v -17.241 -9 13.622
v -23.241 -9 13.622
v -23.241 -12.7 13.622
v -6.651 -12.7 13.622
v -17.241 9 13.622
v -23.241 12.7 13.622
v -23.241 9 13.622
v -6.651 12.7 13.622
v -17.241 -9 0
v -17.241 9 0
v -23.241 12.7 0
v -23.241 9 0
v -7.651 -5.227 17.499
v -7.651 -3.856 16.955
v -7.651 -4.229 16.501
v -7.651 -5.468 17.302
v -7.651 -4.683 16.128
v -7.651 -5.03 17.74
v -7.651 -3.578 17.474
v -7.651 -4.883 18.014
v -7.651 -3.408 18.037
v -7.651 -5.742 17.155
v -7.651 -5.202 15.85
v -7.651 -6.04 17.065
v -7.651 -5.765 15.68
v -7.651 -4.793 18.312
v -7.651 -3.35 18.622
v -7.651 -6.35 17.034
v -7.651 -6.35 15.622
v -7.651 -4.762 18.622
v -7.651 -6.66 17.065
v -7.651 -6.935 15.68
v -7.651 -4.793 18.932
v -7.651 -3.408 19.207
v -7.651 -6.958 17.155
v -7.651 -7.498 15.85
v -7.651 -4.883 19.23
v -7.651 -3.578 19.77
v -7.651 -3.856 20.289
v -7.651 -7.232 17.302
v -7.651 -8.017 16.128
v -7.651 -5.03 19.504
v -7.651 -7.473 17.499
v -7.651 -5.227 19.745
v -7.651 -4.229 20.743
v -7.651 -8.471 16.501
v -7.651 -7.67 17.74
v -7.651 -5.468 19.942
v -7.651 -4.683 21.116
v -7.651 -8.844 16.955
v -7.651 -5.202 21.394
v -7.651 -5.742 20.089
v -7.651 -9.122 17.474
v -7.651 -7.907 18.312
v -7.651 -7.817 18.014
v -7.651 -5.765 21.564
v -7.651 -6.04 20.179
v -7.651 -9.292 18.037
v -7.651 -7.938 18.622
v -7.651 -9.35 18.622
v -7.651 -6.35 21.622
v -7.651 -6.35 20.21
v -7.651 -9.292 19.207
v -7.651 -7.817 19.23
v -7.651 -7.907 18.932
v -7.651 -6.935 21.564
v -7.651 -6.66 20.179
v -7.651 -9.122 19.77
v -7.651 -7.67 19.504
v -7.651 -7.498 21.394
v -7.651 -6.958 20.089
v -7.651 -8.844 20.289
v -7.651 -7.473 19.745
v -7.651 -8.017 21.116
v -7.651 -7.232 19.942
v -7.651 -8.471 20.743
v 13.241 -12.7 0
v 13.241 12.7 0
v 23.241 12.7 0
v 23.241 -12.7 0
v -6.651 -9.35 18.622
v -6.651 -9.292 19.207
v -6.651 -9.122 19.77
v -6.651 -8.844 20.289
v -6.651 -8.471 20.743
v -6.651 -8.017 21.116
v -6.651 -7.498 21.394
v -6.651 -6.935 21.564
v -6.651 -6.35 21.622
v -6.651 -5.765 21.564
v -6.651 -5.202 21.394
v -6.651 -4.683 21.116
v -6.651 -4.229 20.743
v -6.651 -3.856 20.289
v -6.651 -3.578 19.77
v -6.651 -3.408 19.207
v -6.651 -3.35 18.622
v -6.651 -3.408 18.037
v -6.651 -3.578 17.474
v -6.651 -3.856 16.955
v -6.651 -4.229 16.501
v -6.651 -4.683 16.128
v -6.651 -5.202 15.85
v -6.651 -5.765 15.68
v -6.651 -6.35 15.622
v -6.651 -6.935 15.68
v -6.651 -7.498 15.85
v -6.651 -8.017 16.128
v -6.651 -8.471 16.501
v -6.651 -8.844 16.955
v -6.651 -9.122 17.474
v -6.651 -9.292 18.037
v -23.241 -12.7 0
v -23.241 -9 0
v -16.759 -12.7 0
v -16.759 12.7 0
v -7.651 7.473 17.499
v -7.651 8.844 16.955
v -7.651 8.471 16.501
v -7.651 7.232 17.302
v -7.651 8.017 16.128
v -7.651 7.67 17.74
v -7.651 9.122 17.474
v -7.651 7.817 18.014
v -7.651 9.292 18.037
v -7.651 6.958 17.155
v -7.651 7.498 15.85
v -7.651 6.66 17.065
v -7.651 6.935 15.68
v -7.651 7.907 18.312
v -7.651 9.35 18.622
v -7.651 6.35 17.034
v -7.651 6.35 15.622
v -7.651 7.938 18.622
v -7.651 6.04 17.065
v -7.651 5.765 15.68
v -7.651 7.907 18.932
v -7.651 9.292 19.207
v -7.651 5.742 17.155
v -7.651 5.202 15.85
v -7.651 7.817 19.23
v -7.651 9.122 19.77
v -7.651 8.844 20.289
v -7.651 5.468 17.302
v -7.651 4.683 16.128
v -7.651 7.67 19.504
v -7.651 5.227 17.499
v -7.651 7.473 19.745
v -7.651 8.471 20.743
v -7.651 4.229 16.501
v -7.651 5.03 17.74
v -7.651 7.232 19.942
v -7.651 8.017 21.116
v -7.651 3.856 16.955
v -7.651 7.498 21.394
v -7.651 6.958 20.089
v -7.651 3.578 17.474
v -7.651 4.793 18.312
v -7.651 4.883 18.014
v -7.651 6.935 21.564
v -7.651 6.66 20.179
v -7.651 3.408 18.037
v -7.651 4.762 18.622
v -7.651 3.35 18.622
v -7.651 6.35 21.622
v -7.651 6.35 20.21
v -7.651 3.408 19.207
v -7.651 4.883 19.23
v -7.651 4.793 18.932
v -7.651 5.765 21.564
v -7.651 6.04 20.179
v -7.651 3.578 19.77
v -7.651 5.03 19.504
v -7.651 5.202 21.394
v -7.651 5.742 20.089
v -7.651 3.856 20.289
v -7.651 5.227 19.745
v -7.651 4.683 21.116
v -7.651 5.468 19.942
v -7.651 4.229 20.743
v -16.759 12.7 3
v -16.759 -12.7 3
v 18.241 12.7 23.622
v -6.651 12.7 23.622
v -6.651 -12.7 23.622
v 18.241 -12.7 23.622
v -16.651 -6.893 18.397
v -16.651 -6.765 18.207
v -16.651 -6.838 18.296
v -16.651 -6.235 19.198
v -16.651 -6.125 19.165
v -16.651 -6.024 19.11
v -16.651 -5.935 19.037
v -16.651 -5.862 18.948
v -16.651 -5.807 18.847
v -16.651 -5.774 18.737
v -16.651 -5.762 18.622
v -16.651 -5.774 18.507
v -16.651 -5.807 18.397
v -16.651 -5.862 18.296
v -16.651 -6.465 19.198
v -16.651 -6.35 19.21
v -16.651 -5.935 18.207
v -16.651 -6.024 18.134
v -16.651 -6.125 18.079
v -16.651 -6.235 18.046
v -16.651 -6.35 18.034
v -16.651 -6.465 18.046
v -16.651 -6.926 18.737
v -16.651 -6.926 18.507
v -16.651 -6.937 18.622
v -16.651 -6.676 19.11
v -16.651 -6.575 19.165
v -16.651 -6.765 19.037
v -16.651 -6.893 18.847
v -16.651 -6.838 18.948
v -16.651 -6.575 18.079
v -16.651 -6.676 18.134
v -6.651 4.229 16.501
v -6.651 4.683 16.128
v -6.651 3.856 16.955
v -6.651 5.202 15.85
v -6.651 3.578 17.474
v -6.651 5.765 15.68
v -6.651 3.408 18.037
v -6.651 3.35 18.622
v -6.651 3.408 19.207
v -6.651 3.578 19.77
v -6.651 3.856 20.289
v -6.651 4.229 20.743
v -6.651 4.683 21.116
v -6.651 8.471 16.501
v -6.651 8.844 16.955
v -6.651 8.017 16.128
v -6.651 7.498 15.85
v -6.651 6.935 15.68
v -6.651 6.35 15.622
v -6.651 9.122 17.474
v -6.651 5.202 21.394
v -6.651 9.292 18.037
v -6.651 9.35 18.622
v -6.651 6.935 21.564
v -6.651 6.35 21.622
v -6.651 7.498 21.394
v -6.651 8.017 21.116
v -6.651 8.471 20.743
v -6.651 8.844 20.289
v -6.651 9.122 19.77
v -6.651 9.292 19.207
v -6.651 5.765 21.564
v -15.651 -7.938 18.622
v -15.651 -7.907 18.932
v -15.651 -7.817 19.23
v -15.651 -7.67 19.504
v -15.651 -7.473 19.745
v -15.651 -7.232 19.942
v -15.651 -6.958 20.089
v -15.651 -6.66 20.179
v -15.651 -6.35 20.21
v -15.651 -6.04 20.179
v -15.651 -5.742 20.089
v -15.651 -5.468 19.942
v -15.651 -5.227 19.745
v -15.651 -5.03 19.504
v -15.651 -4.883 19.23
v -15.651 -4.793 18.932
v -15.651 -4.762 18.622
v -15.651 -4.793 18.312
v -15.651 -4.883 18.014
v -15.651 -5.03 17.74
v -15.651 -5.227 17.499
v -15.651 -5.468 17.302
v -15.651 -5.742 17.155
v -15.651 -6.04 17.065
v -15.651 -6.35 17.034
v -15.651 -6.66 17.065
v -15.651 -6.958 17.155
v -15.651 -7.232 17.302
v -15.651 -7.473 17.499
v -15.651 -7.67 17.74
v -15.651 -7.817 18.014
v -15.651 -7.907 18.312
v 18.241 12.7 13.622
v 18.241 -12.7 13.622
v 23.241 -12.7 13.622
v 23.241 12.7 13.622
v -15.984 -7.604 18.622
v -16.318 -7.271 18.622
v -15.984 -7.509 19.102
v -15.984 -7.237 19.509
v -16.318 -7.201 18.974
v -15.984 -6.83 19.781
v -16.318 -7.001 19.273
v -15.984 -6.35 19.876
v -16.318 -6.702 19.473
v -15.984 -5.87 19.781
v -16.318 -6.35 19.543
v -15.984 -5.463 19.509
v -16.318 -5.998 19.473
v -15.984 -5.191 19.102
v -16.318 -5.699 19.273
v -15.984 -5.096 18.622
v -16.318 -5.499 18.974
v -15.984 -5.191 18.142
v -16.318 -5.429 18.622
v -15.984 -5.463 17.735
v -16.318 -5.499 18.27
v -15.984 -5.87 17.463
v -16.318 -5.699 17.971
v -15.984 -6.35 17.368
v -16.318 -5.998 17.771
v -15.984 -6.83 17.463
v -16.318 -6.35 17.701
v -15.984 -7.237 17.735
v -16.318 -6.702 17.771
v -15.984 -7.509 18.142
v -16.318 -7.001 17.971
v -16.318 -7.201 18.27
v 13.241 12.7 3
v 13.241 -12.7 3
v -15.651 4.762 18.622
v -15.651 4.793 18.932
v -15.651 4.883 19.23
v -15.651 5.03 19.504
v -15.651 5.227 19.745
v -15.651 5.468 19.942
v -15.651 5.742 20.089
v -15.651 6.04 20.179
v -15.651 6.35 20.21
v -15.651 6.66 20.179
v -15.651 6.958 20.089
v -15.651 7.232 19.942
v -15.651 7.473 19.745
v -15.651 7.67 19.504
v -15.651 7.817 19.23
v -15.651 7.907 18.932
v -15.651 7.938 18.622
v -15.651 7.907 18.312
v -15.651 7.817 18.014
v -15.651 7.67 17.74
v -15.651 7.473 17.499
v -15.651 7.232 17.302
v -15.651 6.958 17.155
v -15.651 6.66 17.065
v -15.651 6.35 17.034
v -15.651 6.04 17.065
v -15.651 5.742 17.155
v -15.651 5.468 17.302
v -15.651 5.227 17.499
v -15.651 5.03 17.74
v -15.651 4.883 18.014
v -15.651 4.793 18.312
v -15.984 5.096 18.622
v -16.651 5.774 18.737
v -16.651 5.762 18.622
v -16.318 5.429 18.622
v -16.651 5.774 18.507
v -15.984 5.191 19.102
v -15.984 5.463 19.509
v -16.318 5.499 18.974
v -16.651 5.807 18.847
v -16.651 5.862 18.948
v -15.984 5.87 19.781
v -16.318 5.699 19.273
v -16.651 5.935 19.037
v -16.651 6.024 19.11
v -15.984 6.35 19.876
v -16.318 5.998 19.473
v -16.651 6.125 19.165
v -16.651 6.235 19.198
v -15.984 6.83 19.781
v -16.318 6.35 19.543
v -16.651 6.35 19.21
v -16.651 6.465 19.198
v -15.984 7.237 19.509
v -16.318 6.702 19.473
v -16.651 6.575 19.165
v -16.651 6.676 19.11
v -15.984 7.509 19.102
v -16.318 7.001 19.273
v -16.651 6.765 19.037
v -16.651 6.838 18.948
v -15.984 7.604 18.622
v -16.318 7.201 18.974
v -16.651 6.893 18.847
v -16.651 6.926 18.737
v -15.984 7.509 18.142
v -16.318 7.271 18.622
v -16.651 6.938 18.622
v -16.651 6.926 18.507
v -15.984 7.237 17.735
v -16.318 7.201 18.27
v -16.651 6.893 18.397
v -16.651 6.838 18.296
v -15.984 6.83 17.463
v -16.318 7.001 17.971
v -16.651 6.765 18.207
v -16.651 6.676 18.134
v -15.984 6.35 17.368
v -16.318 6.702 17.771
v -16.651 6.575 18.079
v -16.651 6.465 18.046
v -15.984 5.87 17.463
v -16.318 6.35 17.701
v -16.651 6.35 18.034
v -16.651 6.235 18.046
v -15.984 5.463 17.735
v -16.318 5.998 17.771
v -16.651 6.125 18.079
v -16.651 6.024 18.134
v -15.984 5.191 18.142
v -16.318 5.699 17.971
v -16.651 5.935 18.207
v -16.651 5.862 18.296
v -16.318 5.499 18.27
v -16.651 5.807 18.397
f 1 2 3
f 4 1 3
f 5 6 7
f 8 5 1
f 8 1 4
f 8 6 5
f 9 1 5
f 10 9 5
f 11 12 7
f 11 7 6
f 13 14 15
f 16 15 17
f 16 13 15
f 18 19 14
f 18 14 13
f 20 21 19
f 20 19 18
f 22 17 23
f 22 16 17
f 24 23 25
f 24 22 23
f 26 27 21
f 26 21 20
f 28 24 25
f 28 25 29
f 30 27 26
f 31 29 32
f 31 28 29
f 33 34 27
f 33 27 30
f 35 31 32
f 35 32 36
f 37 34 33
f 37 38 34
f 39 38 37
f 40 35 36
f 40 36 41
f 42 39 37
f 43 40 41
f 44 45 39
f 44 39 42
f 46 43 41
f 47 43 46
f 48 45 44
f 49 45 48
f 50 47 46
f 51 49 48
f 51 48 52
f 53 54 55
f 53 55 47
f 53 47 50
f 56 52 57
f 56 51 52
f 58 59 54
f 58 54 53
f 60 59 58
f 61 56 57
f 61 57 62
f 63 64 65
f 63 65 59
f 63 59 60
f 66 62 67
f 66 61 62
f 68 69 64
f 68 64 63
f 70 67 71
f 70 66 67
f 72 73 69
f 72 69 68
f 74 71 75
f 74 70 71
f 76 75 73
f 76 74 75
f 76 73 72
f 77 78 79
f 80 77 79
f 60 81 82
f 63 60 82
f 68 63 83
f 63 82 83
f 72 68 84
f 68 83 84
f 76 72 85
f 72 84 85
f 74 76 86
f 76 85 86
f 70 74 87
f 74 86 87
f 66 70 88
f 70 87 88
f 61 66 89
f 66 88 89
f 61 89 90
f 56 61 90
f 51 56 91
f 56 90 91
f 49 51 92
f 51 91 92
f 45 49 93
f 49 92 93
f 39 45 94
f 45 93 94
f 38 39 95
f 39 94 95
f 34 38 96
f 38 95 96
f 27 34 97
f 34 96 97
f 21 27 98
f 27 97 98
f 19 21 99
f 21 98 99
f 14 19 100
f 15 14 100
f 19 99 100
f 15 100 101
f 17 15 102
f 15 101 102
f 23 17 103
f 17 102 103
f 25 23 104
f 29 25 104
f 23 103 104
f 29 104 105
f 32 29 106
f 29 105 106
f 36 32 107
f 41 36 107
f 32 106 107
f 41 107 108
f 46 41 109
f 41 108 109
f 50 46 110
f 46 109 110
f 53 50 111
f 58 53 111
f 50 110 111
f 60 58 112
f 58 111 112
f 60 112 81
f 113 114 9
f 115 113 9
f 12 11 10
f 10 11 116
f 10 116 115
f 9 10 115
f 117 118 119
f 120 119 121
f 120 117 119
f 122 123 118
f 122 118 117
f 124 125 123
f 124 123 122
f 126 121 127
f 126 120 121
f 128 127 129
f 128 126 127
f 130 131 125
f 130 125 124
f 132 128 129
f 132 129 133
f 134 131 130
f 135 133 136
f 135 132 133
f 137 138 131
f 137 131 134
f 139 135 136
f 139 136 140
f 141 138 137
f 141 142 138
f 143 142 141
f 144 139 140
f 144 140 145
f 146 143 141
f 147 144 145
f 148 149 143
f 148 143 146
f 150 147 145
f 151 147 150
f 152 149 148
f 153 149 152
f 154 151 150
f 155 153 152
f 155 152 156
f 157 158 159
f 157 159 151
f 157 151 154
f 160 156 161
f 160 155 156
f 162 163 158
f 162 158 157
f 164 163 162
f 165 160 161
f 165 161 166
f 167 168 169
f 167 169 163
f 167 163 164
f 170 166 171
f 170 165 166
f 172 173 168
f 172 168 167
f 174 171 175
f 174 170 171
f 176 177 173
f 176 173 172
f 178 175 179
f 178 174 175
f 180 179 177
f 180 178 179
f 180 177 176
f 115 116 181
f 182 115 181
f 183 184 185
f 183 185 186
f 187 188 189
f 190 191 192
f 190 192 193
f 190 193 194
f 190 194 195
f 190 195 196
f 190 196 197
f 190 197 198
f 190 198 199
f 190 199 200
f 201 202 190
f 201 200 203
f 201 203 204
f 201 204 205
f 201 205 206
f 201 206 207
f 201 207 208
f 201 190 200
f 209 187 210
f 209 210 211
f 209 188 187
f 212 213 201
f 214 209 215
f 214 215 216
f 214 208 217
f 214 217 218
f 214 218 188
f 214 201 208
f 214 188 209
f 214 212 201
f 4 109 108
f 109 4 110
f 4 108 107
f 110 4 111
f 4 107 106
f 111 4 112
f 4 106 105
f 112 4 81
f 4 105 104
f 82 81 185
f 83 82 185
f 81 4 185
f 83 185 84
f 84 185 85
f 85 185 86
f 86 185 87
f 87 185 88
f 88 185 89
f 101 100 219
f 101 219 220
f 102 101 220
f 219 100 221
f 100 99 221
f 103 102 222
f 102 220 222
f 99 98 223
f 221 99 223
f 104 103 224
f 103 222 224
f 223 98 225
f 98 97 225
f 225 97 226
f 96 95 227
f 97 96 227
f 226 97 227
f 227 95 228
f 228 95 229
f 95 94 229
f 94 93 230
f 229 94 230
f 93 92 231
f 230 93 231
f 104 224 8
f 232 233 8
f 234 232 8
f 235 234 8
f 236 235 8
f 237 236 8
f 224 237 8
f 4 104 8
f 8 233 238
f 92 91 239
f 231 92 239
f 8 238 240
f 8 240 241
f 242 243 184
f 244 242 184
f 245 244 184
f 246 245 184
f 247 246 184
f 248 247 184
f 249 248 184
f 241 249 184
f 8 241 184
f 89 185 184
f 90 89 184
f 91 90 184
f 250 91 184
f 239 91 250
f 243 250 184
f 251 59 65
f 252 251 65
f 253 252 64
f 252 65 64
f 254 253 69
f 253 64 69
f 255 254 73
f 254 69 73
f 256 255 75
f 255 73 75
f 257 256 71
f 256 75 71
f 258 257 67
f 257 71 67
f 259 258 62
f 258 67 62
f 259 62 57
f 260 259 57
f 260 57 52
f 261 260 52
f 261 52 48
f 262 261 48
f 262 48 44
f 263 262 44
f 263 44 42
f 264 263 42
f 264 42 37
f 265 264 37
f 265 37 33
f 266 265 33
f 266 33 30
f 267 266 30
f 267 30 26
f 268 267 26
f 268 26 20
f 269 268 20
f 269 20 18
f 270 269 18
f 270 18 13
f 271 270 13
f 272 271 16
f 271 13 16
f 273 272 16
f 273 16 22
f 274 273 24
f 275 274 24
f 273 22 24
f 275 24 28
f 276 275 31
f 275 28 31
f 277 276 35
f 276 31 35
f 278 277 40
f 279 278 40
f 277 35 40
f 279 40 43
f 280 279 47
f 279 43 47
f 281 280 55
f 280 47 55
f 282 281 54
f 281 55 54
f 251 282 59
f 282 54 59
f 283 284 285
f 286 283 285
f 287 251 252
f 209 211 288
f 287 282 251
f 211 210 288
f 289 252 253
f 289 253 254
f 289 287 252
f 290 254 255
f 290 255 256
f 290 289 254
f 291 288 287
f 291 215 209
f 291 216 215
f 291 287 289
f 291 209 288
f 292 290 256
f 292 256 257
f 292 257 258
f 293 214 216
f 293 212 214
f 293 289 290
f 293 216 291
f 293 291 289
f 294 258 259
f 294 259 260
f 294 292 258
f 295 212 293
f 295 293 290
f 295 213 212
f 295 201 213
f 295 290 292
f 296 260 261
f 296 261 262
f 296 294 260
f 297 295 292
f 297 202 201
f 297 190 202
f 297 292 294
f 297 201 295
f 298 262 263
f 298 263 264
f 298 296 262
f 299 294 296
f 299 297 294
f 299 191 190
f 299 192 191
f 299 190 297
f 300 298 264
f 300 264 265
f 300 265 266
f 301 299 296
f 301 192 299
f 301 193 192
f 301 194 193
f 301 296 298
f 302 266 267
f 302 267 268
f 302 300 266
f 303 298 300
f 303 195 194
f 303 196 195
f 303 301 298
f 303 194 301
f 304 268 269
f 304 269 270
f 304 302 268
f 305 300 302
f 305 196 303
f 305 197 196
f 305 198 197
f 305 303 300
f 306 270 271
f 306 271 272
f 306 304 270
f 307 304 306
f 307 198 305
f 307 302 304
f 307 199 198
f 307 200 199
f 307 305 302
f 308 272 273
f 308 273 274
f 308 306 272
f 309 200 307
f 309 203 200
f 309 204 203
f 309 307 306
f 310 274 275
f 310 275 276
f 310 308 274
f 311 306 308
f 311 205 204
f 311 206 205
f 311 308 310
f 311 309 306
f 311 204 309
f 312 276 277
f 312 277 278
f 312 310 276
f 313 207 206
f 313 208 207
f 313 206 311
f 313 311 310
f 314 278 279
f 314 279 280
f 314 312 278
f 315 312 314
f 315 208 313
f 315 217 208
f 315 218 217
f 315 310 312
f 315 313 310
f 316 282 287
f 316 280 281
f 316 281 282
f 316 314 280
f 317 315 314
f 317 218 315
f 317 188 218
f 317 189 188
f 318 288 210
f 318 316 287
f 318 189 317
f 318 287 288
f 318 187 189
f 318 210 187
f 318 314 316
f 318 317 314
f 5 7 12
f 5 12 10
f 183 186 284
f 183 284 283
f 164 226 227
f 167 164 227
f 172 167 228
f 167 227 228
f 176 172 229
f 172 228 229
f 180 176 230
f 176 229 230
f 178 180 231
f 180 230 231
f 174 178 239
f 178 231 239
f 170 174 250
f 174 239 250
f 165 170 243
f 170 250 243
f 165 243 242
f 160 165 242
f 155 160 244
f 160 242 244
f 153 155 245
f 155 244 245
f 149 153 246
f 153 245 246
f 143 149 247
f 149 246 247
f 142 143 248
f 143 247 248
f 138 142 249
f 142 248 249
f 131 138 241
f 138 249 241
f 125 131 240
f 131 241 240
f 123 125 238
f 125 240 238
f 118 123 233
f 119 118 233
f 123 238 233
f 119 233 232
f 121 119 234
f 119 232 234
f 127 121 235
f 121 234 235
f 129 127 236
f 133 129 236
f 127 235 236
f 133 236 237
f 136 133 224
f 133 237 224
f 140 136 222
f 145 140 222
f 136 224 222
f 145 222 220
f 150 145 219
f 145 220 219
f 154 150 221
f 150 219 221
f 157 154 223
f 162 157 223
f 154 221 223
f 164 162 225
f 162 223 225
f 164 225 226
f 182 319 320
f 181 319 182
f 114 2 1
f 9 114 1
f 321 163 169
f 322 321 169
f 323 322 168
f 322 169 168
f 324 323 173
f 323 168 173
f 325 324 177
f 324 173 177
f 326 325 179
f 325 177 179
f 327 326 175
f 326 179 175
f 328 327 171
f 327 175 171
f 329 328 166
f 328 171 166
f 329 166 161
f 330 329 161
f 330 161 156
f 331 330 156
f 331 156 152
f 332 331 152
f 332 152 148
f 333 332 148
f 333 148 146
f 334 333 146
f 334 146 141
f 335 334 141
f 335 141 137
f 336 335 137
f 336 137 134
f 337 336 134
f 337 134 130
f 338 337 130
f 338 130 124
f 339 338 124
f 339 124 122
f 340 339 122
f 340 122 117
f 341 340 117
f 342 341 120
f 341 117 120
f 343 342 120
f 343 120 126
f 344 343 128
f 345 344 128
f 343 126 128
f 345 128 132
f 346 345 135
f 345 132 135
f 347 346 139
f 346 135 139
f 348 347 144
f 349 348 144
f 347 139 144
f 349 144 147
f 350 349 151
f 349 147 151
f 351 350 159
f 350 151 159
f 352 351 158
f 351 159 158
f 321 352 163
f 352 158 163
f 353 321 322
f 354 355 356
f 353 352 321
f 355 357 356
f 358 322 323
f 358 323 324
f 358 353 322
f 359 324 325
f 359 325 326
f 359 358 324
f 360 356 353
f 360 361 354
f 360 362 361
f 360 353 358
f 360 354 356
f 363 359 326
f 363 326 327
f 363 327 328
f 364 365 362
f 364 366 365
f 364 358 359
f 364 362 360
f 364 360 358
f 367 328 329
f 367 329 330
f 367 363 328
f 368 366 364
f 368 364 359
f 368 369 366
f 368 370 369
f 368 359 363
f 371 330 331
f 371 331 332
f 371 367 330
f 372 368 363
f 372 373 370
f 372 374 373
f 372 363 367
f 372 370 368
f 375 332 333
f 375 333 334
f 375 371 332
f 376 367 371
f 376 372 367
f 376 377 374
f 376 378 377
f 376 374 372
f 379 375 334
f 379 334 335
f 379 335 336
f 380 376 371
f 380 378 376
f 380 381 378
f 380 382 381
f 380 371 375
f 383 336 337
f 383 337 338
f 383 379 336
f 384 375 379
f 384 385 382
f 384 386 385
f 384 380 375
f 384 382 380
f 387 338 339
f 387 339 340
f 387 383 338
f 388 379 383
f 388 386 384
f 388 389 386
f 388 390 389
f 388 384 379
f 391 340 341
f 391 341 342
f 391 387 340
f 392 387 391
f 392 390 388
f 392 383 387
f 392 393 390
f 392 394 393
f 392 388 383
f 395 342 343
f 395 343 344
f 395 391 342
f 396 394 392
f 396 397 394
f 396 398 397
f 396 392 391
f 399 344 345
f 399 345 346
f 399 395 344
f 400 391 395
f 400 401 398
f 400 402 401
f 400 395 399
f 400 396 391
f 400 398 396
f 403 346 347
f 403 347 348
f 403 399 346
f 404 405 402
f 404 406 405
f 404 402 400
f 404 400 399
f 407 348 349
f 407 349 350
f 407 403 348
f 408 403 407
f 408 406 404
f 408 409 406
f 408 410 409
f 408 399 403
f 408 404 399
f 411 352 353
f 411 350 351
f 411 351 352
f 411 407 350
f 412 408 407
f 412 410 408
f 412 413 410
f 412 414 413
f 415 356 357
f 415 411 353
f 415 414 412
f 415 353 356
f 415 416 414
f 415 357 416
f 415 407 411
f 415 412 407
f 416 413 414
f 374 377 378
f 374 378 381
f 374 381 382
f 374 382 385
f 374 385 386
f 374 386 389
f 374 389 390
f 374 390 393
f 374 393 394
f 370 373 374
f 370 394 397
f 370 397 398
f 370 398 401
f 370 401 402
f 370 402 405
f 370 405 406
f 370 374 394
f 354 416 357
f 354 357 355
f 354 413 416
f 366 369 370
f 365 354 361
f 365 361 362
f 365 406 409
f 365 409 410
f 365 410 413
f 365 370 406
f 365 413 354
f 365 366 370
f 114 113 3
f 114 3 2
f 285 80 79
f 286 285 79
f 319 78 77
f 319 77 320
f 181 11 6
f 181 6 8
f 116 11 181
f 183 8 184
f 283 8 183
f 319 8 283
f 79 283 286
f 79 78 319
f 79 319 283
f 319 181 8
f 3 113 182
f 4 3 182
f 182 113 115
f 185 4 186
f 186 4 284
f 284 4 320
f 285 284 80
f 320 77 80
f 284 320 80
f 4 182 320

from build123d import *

# Parameters (mm, degrees)
F0_W      = 46.482
F0_H      = 25.4
F1_DEPTH  = 23.622
F2_W      = 16.59
F2_H      = 25.4
F2_W_2    = 5
F3_DEPTH  = 10
F4_W      = 6
F4_H      = 18
F5_DEPTH  = 13.623
F6_W      = 30
F6_H      = 3
F7_DEPTH  = 25.401
F8_R      = 1.5875
F9_DEPTH  = 10
F10_R     = 3
F11_DEPTH = 1
F12_SIZE  = 1


with BuildPart() as f1:
    # F0 (on Top) → F1 (new body)
    with BuildSketch(Plane.XY):
        Rectangle(F0_W, F0_H)
    extrude(amount=F1_DEPTH)

    # F2 (on face) → F3 (cut)
    with BuildSketch(Plane.XY.offset(23.622)):
        with Locations((-14.946, 0)):
            Rectangle(F2_W, F2_H)
        with Locations((20.741, 0)):
            Rectangle(F2_W_2, F2_H)
    extrude(amount=-F3_DEPTH, mode=Mode.SUBTRACT)

    # F4 (on face) → F5 (cut, through all)
    with BuildSketch(Plane.XY.offset(13.622)):
        with Locations((-20.241, 0)):
            Rectangle(F4_W, F4_H)
    extrude(amount=-F5_DEPTH, mode=Mode.SUBTRACT)

    # F6 (on face) → F7 (cut, through all)
    with BuildSketch(Plane(origin=(0, 12.7, 0), x_dir=(-1, 0, 0), z_dir=(0, 1, 0))):
        with Locations((1.759, 1.5)):
            Rectangle(F6_W, F6_H)
    extrude(amount=-F7_DEPTH, mode=Mode.SUBTRACT)

    # F8 (on face) → F9 (join)
    with BuildSketch(Plane(origin=(-6.651, 0, 0), x_dir=(0, -1, 0), z_dir=(-1, 0, 0))):
        with Locations((-6.35, 18.622)):
            Circle(F8_R)
        with Locations((6.35, 18.622)):
            Circle(F8_R)
    extrude(amount=F9_DEPTH)

    # F10 (on face) → F11 (join)
    with BuildSketch(Plane(origin=(-6.651, 0, 0), x_dir=(0, -1, 0), z_dir=(-1, 0, 0))):
        with Locations((-6.35, 18.622)):
            Circle(F10_R)
        with Locations((6.35, 18.622)):
            Circle(F10_R)
    extrude(amount=F11_DEPTH)

    # F12
    f12_edges = [f1.edges().sort_by_distance(p)[0] for p in [
        (-16.651, 7.9375, 18.622),
        (-16.651, -4.7625, 18.622),
    ]]
    chamfer(f12_edges, length=F12_SIZE)


solid = f1.part
